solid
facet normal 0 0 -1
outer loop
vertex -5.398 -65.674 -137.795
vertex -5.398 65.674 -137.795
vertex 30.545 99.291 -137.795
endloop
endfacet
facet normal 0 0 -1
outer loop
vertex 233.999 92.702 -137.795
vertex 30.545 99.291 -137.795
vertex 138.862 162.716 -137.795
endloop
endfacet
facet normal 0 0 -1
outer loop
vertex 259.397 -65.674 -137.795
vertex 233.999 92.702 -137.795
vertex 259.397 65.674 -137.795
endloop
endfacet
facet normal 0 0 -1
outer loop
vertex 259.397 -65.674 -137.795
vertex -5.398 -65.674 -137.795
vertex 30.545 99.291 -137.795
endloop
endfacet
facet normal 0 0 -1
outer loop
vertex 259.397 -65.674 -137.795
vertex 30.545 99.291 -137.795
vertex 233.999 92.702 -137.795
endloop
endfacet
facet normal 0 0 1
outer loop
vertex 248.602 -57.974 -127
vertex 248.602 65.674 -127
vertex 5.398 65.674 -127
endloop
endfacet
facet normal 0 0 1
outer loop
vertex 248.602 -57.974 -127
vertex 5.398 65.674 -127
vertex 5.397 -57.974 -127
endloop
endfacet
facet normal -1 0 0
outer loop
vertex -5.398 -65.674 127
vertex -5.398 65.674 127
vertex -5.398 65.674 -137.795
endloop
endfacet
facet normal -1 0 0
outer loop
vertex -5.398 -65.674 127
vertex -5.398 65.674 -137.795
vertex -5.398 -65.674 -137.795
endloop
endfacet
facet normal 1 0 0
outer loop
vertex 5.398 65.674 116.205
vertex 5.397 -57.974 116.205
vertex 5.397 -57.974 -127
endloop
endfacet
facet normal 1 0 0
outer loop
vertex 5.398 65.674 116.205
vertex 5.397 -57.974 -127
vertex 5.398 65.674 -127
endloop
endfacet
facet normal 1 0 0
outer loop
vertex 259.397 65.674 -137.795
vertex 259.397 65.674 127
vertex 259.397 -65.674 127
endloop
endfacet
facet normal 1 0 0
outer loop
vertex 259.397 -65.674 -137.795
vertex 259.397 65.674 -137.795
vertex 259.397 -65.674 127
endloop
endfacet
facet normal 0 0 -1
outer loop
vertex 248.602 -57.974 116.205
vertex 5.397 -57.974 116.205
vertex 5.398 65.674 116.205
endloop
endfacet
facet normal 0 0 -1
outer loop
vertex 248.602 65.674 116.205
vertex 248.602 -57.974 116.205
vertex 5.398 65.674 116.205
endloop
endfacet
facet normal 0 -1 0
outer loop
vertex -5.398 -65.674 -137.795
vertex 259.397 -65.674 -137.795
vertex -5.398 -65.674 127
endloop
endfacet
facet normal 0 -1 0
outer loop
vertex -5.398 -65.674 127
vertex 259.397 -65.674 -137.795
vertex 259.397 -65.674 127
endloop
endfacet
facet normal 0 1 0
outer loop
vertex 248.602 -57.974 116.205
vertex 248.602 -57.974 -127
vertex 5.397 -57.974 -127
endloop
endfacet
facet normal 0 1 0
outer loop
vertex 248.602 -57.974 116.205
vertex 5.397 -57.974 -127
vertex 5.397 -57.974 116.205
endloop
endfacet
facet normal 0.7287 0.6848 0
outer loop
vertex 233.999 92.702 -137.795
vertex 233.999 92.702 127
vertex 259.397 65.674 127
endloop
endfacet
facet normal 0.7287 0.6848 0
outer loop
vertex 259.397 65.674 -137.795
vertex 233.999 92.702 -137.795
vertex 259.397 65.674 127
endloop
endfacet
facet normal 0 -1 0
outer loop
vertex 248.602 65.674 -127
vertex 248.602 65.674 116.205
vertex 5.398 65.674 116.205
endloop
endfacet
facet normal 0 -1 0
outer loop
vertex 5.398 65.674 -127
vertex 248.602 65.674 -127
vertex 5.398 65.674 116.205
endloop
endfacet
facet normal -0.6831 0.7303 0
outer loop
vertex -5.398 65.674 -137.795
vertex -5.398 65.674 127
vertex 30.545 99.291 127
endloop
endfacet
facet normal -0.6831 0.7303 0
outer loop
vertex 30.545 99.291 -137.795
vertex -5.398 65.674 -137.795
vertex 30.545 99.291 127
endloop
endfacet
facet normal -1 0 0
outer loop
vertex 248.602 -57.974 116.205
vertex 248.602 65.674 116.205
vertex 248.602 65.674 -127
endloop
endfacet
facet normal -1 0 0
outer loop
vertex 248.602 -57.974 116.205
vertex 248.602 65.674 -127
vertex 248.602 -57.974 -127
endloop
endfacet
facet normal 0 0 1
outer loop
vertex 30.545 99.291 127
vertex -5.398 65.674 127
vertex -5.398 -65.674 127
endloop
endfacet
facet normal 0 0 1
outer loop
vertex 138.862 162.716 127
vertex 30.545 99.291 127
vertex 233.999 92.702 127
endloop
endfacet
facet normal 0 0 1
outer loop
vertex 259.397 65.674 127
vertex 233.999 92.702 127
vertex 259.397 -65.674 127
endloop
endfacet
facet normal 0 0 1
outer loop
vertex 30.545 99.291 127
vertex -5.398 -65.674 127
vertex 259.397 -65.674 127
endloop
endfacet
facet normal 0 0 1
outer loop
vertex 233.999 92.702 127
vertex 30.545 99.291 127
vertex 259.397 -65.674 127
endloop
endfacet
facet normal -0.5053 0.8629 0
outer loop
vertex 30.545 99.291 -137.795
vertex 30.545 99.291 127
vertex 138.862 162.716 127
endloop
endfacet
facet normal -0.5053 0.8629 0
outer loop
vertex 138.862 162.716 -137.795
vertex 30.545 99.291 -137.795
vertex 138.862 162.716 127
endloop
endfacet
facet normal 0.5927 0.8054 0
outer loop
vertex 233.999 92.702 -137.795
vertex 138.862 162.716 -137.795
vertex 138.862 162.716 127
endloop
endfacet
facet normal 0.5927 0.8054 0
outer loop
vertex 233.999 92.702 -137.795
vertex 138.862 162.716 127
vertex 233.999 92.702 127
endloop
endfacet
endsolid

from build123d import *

# Parameters (mm, degrees)
F0_W          = 10.795
F0_H          = 131.347498
F1_DEPTH      = 127
F1_DEPTH_BACK = 127
F2_W          = 131.347498
F2_H          = 10.795
F3_DEPTH      = 254
F4_W          = 10.795
F4_H          = 131.347498
F5_DEPTH      = 254
F6_W          = 131.347498
F6_H          = 10.795
F7_DEPTH      = 254
F8_W          = 7.69969
F8_H          = 264.795
F9_DEPTH      = 254
F11_DEPTH     = 264.795


with BuildPart() as f1:
    # F0 (on Top) → F1 (new body, two sides)
    with BuildSketch(Plane.XY) as f1_sk:
        Rectangle(F0_W, F0_H)
    extrude(amount=F1_DEPTH)
    extrude(f1_sk.sketch, amount=-F1_DEPTH_BACK)

    # F2 (on face) → F3 (join)
    with BuildSketch(Plane.YZ.offset(5.3975)):
        with Locations((0, 121.6025)):
            Rectangle(F2_W, F2_H)
    extrude(amount=F3_DEPTH)

    # F4 (on face) → F5 (join)
    with BuildSketch(Plane(origin=(0, 0, 116.205), x_dir=(1, 0, 0), z_dir=(0, 0, -1))):
        with Locations((254, 0)):
            Rectangle(F4_W, F4_H)
    extrude(amount=F5_DEPTH)

    # F6 (on face) → F7 (join)
    with BuildSketch(Plane(origin=(248.6025, 0, 0), x_dir=(0, -1, 0), z_dir=(-1, 0, 0))):
        with Locations((0, -132.3975)):
            Rectangle(F6_W, F6_H)
    extrude(amount=F7_DEPTH)

    # F8 (on face) → F9 (join)
    with BuildSketch(Plane.YZ.offset(259.3975)):
        with Locations((-61.823904, -5.3975)):
            Rectangle(F8_W, F8_H)
    extrude(amount=-F9_DEPTH)

    # F10 (on face) → F11 (join)
    with BuildSketch(Plane(origin=(0, 0, -137.795), x_dir=(1, 0, 0), z_dir=(0, 0, -1))):
        Polygon((233.998537, -92.701845), (259.3975, -65.673749), (-5.3975, -65.673749), (30.545302, -99.291421), (138.861507, -162.71612), align=None)
    extrude(amount=-F11_DEPTH)


solid = f1.part
